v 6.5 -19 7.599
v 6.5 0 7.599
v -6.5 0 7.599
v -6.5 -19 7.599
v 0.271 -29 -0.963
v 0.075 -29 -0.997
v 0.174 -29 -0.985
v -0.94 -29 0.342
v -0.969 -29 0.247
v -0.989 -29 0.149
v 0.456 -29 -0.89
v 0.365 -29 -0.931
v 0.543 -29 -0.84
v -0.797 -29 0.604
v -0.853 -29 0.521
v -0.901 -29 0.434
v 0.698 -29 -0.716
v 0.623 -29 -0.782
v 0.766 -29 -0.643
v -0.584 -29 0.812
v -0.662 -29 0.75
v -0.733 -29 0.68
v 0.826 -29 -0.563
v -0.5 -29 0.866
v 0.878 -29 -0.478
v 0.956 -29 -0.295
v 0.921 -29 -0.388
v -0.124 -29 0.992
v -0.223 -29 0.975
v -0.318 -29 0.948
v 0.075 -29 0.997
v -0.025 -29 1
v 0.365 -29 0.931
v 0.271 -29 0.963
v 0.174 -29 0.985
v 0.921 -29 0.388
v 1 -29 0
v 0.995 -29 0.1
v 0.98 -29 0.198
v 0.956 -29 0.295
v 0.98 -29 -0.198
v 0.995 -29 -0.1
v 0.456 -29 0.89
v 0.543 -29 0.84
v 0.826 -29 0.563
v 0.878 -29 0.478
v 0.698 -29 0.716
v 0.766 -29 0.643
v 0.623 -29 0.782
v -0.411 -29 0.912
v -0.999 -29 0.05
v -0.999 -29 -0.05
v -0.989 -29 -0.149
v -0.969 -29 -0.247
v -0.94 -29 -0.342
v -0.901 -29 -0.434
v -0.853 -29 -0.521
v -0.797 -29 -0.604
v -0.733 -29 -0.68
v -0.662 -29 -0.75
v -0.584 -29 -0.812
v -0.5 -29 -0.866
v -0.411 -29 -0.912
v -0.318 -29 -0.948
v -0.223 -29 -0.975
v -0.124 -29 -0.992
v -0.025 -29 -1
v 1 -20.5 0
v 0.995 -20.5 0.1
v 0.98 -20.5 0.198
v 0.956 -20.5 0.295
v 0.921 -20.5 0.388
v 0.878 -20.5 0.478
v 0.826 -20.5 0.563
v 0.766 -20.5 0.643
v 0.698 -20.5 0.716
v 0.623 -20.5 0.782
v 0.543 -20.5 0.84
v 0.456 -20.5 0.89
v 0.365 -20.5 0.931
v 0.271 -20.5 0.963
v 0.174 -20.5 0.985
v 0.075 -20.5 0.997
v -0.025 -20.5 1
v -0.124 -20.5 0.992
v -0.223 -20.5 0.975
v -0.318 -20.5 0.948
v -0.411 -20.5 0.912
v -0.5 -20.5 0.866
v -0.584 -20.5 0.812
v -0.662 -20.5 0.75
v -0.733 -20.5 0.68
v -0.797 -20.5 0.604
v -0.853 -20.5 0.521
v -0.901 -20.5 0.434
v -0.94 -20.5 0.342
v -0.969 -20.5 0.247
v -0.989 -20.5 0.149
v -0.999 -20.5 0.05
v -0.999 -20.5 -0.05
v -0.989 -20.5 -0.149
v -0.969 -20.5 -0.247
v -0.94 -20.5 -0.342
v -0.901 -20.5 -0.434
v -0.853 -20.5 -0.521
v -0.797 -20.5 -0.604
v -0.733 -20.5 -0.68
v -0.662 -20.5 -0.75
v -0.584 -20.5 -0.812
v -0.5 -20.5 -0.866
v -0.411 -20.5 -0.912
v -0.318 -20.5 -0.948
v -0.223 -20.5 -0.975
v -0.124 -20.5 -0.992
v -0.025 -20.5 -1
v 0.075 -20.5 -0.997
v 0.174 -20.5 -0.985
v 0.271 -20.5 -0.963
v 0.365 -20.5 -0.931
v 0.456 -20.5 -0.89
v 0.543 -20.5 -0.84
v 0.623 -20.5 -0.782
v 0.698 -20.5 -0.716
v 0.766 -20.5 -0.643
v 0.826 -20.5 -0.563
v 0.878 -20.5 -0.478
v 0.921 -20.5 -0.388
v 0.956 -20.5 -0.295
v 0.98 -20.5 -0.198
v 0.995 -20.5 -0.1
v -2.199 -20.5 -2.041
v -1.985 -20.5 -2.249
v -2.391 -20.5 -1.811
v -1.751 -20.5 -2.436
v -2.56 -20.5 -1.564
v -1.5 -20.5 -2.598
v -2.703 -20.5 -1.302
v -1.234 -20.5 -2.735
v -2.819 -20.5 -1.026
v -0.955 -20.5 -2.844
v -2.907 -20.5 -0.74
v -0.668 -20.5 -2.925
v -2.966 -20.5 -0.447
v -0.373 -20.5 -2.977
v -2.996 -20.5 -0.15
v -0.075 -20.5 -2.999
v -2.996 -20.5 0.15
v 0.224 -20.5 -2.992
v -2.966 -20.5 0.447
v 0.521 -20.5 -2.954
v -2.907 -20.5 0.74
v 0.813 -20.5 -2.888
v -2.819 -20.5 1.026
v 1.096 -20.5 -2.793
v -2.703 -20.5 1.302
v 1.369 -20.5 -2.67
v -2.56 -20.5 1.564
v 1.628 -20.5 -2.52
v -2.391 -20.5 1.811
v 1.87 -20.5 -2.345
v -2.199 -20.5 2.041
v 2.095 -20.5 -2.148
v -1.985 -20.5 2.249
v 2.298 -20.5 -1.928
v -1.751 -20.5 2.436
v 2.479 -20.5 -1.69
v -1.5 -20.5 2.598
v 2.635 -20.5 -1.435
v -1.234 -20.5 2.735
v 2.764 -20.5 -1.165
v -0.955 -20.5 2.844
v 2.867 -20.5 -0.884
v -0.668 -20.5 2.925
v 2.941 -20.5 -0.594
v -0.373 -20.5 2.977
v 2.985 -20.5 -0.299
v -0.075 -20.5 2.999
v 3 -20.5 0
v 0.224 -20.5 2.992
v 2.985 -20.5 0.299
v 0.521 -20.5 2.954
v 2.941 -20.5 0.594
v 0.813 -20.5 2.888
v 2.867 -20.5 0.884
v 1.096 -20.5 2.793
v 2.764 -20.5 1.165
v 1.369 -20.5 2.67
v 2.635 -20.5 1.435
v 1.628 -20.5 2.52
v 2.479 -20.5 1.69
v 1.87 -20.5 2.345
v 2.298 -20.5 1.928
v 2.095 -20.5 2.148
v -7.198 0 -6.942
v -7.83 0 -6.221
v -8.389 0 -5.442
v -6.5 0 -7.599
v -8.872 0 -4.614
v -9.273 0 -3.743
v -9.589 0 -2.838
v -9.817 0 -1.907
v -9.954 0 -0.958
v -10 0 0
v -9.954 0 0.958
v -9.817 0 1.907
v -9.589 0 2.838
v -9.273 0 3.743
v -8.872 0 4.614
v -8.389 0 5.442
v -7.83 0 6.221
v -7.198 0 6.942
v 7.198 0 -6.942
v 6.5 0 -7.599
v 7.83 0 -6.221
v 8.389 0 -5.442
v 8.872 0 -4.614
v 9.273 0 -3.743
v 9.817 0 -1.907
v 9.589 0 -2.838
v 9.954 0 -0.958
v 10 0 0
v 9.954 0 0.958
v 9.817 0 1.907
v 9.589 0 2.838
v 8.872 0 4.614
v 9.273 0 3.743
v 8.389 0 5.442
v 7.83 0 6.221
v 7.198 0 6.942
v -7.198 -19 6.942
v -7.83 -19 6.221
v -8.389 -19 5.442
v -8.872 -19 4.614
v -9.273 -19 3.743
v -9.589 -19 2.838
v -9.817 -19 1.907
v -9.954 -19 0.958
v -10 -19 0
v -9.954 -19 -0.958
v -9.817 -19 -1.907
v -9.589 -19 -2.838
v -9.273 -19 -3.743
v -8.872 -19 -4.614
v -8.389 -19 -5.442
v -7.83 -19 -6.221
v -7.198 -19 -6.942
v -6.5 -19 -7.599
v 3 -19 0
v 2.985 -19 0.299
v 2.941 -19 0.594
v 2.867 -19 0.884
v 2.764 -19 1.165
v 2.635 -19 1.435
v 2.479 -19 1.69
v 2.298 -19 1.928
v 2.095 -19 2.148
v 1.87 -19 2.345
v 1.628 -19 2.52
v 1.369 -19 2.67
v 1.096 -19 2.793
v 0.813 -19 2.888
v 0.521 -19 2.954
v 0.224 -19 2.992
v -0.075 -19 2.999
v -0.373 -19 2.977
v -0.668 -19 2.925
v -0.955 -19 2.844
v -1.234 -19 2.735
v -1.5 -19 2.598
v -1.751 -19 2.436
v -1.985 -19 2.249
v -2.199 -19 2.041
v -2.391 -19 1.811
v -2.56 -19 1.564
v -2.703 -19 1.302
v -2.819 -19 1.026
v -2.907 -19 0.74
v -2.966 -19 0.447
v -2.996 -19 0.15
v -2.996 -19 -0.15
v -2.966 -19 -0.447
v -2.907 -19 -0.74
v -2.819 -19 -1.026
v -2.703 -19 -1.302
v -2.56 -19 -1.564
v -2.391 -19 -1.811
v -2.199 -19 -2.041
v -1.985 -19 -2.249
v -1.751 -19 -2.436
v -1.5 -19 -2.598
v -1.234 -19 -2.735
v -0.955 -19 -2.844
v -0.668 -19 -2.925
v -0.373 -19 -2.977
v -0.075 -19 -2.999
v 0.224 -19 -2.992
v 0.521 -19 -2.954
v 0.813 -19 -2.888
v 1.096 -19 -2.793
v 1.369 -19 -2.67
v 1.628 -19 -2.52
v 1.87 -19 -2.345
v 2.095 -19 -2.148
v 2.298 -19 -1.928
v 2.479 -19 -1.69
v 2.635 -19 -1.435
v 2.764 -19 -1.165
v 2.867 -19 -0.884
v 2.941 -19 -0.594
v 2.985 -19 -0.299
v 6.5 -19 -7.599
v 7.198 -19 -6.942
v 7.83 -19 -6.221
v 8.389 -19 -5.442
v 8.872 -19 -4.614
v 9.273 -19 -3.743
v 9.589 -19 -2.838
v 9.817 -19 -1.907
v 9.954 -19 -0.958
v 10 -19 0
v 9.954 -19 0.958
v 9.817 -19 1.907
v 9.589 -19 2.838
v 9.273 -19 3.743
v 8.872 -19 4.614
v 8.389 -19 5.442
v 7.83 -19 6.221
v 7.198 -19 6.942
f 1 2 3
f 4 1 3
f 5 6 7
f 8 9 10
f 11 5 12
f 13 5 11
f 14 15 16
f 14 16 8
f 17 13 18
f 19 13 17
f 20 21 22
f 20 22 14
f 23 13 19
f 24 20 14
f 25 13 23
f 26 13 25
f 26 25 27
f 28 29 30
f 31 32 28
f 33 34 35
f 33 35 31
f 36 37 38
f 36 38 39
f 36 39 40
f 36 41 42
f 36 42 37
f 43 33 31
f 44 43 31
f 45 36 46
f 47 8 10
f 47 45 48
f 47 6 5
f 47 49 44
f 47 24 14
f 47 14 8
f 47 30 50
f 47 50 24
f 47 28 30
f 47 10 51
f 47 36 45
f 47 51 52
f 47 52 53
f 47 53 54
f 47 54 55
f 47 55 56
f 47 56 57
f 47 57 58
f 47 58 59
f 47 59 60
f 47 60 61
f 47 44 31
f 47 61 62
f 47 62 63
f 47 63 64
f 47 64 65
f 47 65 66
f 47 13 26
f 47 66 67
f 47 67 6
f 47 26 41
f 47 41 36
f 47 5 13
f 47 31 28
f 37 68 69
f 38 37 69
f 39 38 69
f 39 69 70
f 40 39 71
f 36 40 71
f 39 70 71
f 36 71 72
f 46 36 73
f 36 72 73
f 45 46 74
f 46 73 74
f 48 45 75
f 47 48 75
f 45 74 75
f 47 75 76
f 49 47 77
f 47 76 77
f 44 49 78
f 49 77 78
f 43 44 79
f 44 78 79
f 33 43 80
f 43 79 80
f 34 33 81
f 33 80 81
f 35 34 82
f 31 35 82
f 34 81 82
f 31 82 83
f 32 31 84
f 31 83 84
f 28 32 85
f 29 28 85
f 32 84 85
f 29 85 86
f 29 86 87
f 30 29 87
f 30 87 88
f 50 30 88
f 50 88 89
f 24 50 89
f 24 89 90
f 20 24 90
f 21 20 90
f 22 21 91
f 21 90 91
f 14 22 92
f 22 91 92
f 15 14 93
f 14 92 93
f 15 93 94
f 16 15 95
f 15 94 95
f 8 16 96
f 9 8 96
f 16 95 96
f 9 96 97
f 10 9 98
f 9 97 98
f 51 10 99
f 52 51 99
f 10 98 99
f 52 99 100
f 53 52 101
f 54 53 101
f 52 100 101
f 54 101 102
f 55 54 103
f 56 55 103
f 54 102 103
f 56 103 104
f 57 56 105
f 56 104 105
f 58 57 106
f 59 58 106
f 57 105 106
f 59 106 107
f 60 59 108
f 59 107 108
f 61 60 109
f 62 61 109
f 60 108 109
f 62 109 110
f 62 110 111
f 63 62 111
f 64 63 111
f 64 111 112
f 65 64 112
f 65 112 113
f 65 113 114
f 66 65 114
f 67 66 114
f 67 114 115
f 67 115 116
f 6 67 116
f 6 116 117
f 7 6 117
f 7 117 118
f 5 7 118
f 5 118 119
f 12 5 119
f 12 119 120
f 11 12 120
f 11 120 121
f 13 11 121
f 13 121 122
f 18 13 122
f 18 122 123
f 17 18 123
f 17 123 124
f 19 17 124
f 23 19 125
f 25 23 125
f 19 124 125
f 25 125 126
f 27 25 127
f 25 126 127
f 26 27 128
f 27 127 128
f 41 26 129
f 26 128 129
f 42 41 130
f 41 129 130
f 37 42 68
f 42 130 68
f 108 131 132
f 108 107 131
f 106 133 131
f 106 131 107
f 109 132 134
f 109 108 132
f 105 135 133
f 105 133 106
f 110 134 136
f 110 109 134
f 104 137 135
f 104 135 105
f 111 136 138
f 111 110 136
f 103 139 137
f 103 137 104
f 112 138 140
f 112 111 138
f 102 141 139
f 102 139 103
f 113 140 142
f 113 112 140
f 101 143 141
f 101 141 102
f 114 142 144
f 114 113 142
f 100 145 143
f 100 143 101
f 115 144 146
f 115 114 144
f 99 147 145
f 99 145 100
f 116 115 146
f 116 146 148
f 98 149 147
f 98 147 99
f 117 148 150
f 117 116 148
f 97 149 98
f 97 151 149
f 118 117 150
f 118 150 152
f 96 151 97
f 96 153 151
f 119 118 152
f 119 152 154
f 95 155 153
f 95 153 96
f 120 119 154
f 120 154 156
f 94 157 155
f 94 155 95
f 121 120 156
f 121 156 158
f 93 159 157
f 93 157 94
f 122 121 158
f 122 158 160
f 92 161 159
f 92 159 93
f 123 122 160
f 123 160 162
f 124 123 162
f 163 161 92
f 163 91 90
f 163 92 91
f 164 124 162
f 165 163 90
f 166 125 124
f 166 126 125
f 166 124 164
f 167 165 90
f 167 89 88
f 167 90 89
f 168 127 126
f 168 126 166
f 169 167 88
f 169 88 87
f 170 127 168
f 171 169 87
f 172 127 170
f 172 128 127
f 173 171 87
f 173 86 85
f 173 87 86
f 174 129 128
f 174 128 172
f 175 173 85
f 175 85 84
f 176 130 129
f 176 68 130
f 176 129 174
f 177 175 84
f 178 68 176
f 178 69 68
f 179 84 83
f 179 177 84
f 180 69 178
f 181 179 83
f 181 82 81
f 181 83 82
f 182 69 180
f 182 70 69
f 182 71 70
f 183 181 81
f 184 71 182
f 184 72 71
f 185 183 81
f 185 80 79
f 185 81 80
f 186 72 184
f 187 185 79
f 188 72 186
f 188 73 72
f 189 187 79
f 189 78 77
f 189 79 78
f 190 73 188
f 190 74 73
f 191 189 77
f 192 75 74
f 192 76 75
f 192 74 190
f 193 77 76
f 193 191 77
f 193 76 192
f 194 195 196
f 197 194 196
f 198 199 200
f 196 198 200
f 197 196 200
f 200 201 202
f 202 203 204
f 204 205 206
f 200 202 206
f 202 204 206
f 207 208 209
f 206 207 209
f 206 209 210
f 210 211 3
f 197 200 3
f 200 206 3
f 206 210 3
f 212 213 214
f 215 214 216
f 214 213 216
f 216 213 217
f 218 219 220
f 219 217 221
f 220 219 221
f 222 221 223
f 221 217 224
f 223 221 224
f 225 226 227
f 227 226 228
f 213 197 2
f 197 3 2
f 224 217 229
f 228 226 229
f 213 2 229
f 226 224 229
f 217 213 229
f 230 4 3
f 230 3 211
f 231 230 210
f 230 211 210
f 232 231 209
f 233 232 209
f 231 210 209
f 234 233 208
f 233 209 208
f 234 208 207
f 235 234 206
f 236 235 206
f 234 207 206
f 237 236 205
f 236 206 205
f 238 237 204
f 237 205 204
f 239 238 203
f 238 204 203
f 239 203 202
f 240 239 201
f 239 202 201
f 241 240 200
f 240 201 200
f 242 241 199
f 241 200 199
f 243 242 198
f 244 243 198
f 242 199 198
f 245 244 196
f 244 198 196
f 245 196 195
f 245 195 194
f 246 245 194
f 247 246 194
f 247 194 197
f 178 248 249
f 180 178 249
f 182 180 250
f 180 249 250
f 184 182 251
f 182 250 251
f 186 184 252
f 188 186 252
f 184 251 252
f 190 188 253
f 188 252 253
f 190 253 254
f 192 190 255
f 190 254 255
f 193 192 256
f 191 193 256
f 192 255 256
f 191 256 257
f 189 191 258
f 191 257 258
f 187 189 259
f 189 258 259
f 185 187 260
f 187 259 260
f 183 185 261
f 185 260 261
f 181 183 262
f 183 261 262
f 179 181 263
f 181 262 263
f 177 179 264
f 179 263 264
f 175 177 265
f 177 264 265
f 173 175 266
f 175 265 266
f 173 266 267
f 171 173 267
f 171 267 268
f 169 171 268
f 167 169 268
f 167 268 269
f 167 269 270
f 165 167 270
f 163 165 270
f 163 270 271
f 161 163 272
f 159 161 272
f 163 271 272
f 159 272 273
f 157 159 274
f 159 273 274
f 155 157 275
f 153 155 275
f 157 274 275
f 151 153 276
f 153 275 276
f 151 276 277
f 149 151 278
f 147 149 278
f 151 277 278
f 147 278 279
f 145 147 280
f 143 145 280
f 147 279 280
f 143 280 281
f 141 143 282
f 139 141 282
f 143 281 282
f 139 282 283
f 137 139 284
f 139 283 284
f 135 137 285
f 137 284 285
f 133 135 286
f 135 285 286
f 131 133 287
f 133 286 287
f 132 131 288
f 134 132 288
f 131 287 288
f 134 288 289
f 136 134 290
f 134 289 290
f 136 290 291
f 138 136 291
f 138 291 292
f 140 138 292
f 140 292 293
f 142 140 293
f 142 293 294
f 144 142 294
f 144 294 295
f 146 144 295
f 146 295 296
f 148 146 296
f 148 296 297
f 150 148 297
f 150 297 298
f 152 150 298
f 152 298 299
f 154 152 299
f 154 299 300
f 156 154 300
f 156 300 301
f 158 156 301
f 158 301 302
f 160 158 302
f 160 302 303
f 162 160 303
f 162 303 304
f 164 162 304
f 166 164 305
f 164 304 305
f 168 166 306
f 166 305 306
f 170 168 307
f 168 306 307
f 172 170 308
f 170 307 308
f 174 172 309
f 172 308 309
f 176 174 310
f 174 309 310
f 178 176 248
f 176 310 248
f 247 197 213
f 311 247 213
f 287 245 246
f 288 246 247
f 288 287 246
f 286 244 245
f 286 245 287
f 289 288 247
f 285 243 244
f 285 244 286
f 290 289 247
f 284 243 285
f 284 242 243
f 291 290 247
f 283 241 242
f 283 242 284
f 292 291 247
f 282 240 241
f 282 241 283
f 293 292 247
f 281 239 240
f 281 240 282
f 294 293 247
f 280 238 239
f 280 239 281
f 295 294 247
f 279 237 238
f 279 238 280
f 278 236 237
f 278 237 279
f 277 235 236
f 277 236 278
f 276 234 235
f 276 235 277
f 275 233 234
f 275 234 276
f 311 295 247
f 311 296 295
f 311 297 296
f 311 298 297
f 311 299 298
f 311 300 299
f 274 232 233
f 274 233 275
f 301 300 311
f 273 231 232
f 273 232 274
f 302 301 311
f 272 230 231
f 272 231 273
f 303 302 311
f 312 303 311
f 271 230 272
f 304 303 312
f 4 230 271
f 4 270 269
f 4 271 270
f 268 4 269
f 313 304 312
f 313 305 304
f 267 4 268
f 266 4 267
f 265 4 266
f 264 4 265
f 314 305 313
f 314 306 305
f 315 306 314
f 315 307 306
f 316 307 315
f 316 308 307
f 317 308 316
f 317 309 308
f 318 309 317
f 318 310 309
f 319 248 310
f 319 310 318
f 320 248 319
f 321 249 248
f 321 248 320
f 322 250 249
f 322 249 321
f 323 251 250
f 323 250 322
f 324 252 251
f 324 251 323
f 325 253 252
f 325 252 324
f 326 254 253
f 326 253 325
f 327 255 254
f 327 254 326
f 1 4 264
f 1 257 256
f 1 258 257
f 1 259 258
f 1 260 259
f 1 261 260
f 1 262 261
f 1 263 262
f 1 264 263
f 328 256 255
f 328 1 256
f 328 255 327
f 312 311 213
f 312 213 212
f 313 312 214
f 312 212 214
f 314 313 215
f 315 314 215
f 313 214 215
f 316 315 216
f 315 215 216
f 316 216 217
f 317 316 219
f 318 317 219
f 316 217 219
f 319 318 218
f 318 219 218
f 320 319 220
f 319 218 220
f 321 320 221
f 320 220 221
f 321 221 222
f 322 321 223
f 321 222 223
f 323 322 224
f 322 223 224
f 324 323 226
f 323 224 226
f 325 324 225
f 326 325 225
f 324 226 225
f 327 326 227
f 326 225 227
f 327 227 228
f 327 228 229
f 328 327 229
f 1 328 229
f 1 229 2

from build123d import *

# Parameters (mm, degrees)
F1_DEPTH = 19
F2_R     = 3
F3_DEPTH = 1.5
F4_R     = 1
F5_DEPTH = 8.5


with BuildPart() as f1:
    # F0 (on Front) → F1 (new body)
    with BuildSketch(Plane.XZ):
        with BuildLine():
            Line((6.5, 7.599342), (-6.5, 7.599342))
            ThreePointArc((-6.5, 7.599342), (-10, 0), (-6.5, -7.599342))
            Line((-6.5, -7.599342), (6.5, -7.599342))
            ThreePointArc((6.5, -7.599342), (10, 0), (6.5, 7.599342))
        make_face()
    extrude(amount=F1_DEPTH)

    # F2 (on face) → F3 (join)
    with BuildSketch(Plane.XZ.offset(19)):
        Circle(F2_R)
    extrude(amount=F3_DEPTH)

    # F4 (on face) → F5 (join)
    with BuildSketch(Plane.XZ.offset(20.5)):
        Circle(F4_R)
    extrude(amount=F5_DEPTH)


solid = f1.part
